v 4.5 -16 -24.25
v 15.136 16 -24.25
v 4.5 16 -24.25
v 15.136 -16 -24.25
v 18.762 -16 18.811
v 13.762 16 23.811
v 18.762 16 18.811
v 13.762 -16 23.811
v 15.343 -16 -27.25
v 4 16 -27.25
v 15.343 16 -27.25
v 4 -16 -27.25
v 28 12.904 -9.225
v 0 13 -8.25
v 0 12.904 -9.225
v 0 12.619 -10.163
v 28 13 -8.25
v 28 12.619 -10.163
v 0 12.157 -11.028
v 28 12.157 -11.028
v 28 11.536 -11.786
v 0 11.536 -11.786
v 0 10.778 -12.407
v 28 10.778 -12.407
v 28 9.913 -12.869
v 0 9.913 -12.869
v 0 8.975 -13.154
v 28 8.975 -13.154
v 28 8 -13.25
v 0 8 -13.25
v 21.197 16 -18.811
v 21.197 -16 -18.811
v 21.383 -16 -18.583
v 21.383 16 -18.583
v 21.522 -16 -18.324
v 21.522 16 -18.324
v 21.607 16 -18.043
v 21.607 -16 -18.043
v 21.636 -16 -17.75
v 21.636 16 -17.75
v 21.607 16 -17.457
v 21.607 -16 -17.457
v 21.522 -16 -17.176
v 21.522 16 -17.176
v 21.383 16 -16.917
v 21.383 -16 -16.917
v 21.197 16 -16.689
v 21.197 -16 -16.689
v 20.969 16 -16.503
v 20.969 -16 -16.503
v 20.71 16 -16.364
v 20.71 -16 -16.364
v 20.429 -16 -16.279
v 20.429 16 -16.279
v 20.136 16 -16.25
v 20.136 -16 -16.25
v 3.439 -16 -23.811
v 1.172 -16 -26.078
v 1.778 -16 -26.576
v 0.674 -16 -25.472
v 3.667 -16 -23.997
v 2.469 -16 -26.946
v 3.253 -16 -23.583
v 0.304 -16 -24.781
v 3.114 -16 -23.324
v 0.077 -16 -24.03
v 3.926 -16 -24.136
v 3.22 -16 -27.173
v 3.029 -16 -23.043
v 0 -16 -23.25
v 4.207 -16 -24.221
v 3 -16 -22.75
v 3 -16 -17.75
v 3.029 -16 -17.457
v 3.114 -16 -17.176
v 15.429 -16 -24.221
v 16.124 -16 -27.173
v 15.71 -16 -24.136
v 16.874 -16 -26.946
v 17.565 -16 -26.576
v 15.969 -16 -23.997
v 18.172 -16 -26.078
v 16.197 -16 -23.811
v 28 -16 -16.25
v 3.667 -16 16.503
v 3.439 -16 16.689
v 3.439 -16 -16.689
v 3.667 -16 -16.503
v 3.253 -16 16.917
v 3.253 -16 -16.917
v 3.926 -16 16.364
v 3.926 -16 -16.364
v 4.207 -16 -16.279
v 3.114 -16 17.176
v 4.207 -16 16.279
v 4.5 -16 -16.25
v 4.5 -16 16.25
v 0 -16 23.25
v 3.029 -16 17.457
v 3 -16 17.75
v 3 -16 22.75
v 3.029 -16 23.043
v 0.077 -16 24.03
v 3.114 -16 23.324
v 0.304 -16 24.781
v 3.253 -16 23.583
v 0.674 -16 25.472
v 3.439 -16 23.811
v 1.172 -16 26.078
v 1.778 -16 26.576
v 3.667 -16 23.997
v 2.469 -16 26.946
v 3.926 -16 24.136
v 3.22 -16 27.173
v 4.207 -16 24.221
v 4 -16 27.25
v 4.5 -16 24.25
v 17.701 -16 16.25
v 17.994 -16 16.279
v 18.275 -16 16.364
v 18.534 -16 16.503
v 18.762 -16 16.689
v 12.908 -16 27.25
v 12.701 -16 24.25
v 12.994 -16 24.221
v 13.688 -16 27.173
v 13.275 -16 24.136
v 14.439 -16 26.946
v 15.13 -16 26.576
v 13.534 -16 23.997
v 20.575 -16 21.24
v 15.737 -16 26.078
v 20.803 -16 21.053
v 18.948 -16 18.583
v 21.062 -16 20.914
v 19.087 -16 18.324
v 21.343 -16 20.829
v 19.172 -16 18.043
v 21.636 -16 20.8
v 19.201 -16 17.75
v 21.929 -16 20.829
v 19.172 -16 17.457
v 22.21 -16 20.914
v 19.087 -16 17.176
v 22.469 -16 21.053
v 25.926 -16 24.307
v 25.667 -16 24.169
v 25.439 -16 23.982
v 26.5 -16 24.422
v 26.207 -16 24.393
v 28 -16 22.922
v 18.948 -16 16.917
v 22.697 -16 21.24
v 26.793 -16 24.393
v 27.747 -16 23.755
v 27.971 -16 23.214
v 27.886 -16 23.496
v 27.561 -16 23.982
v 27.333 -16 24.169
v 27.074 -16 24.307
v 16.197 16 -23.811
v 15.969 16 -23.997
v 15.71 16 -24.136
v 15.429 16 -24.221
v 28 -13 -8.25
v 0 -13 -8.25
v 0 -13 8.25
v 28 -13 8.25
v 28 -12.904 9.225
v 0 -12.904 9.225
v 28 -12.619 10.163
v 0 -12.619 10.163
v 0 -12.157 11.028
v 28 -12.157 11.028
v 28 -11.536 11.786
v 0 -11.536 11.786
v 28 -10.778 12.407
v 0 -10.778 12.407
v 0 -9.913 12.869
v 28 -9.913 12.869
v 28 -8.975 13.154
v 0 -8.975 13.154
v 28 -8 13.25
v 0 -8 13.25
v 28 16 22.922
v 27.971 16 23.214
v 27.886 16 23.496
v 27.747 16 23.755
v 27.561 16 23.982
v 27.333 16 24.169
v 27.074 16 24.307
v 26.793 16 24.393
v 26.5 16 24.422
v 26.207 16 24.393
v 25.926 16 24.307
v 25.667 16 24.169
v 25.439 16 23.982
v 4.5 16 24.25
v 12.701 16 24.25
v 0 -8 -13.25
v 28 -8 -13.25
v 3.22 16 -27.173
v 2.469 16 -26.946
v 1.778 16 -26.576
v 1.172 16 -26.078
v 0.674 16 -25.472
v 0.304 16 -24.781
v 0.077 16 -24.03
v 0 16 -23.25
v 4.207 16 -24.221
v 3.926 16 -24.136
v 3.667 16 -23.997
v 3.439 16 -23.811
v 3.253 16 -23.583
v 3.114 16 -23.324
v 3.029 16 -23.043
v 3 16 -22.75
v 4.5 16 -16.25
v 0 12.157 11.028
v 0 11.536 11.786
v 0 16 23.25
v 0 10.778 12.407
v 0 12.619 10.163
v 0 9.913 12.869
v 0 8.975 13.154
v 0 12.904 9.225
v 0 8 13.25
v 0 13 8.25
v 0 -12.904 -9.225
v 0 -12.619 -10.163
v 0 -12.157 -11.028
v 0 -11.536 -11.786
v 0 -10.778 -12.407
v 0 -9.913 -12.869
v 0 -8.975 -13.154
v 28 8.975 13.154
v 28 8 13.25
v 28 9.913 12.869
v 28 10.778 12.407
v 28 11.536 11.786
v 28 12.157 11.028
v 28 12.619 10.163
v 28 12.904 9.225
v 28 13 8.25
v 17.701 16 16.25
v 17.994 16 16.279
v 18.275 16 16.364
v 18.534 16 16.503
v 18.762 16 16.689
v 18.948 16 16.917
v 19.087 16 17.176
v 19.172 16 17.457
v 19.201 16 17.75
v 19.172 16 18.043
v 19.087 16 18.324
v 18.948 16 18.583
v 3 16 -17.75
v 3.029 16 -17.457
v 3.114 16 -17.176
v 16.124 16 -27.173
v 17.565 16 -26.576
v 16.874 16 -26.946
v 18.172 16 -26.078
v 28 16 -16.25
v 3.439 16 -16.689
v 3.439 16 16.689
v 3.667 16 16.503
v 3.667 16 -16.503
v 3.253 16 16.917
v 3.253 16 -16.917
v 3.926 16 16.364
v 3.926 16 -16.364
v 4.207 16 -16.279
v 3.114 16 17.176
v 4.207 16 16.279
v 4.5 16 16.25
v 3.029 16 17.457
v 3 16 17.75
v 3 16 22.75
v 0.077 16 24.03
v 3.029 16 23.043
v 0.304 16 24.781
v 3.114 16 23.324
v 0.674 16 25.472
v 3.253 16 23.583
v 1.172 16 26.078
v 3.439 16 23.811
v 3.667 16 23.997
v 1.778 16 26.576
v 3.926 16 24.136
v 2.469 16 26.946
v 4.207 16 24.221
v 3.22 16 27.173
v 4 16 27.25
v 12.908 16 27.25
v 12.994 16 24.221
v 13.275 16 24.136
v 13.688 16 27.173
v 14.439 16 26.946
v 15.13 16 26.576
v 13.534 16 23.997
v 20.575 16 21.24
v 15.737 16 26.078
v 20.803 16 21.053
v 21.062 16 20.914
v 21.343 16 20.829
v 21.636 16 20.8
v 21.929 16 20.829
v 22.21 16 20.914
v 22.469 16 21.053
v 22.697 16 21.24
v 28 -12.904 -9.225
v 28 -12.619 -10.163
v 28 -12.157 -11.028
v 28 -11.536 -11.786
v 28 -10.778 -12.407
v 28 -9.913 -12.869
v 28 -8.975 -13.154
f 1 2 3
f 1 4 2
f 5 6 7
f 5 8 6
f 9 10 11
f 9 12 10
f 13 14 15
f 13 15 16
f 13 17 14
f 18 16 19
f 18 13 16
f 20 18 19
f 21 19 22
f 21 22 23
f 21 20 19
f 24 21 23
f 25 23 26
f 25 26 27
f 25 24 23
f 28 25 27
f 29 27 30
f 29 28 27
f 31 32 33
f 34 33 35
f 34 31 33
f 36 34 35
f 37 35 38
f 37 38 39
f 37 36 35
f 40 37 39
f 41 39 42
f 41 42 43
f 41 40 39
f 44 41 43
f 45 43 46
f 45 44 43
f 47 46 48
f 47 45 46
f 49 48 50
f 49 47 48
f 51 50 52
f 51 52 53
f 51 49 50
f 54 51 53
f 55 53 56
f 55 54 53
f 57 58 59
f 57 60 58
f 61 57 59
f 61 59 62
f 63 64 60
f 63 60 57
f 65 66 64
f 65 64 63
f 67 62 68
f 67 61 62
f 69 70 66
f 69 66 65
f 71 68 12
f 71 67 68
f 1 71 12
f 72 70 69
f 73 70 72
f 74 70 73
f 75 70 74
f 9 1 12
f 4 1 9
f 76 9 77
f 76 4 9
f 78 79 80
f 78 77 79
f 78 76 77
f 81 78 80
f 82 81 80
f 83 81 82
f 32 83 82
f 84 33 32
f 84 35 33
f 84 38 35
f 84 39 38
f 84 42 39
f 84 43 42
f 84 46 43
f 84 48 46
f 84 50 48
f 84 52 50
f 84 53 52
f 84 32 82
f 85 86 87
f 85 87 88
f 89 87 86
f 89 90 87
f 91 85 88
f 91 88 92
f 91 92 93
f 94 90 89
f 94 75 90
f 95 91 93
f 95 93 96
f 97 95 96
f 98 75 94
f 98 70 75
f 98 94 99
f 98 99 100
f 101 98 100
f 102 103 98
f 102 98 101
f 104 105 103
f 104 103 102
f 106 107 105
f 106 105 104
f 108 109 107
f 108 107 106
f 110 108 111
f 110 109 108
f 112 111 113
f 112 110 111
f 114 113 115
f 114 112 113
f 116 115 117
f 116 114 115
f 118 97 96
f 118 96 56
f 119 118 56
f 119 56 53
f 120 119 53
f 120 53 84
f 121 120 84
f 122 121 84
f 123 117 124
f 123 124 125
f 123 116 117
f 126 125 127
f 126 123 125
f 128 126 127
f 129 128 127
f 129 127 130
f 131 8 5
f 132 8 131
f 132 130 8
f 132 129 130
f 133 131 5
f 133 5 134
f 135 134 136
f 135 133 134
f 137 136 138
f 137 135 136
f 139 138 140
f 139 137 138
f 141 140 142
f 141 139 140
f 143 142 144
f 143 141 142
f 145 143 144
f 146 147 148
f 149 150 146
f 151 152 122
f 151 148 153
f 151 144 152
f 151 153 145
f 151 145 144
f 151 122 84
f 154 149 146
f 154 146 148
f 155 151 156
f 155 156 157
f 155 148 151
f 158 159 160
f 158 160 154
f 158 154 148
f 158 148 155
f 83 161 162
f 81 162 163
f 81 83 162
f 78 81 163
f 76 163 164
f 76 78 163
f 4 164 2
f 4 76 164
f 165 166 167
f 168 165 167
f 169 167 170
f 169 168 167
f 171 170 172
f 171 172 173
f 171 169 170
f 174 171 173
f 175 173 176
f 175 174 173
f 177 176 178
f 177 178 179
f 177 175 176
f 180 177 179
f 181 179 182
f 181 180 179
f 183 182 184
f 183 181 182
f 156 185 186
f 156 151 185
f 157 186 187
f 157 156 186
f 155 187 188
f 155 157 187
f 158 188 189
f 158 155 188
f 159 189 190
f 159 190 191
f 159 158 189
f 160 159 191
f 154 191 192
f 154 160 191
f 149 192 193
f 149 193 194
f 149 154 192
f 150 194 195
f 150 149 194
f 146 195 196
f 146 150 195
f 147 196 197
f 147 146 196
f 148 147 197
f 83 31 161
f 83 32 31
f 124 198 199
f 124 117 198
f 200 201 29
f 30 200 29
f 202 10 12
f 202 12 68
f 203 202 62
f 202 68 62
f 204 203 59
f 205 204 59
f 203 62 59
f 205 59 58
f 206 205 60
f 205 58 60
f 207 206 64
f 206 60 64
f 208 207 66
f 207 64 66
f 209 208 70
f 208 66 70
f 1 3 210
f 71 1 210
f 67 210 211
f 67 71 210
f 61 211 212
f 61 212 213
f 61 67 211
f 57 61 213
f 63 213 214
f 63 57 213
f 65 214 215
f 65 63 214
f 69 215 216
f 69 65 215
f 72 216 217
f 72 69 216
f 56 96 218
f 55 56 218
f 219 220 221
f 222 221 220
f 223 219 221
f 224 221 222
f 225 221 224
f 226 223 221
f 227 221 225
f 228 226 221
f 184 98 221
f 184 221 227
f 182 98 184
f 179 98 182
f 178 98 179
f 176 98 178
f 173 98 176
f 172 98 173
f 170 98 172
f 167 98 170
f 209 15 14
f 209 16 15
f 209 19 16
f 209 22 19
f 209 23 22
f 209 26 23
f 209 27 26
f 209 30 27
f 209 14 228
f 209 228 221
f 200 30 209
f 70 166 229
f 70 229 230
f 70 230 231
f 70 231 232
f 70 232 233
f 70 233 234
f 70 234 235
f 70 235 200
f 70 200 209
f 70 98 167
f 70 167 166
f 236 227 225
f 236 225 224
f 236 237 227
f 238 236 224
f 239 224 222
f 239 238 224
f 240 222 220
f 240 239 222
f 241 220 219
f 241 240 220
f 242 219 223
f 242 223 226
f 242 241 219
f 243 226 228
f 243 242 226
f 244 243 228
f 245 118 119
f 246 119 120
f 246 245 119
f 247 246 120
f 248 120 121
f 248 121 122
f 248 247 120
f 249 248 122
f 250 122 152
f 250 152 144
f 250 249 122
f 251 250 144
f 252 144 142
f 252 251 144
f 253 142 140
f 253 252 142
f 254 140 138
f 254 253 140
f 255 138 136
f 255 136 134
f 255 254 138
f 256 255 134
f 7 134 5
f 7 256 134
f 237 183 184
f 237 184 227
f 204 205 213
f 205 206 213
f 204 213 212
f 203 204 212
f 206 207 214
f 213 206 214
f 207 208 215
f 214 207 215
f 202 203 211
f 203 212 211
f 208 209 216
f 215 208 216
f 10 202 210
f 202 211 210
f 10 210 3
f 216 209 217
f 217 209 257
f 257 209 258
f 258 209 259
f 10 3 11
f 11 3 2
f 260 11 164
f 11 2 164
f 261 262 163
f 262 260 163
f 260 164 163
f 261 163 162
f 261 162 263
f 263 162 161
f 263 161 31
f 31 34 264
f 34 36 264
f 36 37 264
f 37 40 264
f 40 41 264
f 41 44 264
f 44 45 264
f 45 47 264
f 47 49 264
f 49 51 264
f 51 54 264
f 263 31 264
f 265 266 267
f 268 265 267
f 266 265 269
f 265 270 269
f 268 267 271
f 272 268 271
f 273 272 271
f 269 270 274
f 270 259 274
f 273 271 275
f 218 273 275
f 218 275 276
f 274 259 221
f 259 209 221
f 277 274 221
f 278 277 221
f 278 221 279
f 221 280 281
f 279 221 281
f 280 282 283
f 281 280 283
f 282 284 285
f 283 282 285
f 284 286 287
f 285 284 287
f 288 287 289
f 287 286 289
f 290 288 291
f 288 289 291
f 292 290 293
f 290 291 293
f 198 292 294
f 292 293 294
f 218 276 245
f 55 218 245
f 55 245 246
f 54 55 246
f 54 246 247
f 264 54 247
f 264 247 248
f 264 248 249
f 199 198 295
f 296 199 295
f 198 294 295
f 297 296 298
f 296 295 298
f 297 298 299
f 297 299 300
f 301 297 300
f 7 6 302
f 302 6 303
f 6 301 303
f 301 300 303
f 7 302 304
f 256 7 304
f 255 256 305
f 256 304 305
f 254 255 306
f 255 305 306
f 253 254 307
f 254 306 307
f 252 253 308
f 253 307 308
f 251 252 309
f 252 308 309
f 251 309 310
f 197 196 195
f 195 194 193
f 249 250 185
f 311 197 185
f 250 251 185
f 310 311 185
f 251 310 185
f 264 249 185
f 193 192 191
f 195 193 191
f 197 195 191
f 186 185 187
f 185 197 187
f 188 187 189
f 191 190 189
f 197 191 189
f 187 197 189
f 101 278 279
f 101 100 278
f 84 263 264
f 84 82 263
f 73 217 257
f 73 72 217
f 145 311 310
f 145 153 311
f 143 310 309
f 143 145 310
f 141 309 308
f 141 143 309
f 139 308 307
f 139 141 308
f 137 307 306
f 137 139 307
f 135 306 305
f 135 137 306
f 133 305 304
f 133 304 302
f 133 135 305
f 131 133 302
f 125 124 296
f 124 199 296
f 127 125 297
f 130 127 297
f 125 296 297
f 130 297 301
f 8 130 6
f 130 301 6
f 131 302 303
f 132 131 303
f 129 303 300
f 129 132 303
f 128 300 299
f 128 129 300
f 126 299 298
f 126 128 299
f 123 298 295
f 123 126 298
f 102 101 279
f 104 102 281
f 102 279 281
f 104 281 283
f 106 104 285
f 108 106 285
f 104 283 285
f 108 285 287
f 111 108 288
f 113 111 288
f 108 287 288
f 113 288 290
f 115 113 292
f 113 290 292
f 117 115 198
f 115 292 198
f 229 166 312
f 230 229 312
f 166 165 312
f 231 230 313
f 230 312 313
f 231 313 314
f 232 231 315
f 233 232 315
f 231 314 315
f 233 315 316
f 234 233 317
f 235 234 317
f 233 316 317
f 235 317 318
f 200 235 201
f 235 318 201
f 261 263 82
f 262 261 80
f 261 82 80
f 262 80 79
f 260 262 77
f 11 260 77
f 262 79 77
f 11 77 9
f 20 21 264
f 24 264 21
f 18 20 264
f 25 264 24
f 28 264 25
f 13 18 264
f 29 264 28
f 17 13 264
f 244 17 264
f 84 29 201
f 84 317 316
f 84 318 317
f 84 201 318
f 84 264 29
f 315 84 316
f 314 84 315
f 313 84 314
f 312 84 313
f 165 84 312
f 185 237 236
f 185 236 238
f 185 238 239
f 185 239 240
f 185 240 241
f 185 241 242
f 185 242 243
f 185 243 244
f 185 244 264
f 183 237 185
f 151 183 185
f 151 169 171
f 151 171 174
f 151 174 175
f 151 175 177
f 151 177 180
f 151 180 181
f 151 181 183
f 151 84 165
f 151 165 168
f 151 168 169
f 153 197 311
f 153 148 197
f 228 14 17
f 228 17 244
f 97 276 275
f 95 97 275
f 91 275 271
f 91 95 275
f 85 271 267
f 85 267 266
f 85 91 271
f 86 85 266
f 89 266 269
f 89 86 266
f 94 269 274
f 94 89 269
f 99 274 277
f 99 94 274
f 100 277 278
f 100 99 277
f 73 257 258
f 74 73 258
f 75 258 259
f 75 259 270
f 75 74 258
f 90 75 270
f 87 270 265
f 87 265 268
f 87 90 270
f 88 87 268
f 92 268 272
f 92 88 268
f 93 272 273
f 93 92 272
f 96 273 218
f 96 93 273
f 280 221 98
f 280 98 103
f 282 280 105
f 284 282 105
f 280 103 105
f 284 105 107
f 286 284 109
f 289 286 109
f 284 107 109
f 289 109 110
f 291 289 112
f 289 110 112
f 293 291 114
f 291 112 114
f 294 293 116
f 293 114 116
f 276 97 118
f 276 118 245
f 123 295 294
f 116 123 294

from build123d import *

# Parameters (mm, degrees)
F0_W          = 32
F0_H          = 32.5
F0_W_2        = 26
F0_H_2        = 26.5
F1_DEPTH      = 28
F3_DEPTH      = 16
F5_DEPTH      = 16
F5_DEPTH_BACK = 16
F6_R          = 5
F7_R          = 1.5
F8_R          = 4


# Not quite as in the source:
# - a feature names something its author has since deleted; it is built from what else it names


with BuildPart() as f1:
    # F0 (on Right) → F1 (new body)
    with BuildSketch(Plane.YZ):
        Rectangle(F0_W, F0_H)
        Rectangle(F0_W_2, F0_H_2, mode=Mode.SUBTRACT)
    extrude(amount=F1_DEPTH)

    # F2 (on Front) → F3 (join, symmetric)
    with BuildSketch(Plane.XZ):
        Polygon((21.3223304703, 16.25), (28, 16.25), (28, 26.5428932188), (21.6360389693, 20.1789321881), (14.5649711575, 27.25), (0, 27.25), (0, 16.25), (3, 16.25), (3, 24.25), (13.3223304703, 24.25), align=None)
    extrude(amount=F3_DEPTH, both=True)

    # F4 (on Front) → F5 (join, two sides)
    with BuildSketch(Plane.XZ) as f5_sk:
        Polygon((3, -16.25), (0, -16.25), (0, -27.25), (17, -27.25), (28, -16.25), (23.7573593129, -16.25), (15.7573593129, -24.25), (3, -24.25), align=None)
    extrude(amount=F5_DEPTH)
    extrude(f5_sk.sketch, amount=-F5_DEPTH_BACK)

    # F6
    f6_edges = [f1.edges().sort_by_distance(p)[0] for p in [
        (14, 13, -13.25),
        (14, 13, 13.25),
        (14, -13, 13.25),
        (14, -13, -13.25),
    ]]
    fillet(f6_edges, radius=F6_R)

    # F7
    f7_edges = [f1.edges().sort_by_distance(p)[0] for p in [
        (3, 0, 16.25),
        (3, 0, 24.25),
        (13.32233, 0, 24.25),
        (21.32233, 0, 16.25),
        (21.636039, 0, 20.178932),
        (28, 0, 26.542893),
        (3, 0, -16.25),
        (23.757359, 0, -16.25),
        (15.757359, 0, -24.25),
        (3, 0, -24.25),
    ]]
    fillet(f7_edges, radius=F7_R)

    # F8
    f8_edges = [f1.edges().sort_by_distance(p)[0] for p in [
        (0, 0, 27.25),
        (14.564971, 0, 27.25),
        (0, 0, -27.25),
        (17, 0, -27.25),
    ]]
    fillet(f8_edges, radius=F8_R)


solid = f1.part
